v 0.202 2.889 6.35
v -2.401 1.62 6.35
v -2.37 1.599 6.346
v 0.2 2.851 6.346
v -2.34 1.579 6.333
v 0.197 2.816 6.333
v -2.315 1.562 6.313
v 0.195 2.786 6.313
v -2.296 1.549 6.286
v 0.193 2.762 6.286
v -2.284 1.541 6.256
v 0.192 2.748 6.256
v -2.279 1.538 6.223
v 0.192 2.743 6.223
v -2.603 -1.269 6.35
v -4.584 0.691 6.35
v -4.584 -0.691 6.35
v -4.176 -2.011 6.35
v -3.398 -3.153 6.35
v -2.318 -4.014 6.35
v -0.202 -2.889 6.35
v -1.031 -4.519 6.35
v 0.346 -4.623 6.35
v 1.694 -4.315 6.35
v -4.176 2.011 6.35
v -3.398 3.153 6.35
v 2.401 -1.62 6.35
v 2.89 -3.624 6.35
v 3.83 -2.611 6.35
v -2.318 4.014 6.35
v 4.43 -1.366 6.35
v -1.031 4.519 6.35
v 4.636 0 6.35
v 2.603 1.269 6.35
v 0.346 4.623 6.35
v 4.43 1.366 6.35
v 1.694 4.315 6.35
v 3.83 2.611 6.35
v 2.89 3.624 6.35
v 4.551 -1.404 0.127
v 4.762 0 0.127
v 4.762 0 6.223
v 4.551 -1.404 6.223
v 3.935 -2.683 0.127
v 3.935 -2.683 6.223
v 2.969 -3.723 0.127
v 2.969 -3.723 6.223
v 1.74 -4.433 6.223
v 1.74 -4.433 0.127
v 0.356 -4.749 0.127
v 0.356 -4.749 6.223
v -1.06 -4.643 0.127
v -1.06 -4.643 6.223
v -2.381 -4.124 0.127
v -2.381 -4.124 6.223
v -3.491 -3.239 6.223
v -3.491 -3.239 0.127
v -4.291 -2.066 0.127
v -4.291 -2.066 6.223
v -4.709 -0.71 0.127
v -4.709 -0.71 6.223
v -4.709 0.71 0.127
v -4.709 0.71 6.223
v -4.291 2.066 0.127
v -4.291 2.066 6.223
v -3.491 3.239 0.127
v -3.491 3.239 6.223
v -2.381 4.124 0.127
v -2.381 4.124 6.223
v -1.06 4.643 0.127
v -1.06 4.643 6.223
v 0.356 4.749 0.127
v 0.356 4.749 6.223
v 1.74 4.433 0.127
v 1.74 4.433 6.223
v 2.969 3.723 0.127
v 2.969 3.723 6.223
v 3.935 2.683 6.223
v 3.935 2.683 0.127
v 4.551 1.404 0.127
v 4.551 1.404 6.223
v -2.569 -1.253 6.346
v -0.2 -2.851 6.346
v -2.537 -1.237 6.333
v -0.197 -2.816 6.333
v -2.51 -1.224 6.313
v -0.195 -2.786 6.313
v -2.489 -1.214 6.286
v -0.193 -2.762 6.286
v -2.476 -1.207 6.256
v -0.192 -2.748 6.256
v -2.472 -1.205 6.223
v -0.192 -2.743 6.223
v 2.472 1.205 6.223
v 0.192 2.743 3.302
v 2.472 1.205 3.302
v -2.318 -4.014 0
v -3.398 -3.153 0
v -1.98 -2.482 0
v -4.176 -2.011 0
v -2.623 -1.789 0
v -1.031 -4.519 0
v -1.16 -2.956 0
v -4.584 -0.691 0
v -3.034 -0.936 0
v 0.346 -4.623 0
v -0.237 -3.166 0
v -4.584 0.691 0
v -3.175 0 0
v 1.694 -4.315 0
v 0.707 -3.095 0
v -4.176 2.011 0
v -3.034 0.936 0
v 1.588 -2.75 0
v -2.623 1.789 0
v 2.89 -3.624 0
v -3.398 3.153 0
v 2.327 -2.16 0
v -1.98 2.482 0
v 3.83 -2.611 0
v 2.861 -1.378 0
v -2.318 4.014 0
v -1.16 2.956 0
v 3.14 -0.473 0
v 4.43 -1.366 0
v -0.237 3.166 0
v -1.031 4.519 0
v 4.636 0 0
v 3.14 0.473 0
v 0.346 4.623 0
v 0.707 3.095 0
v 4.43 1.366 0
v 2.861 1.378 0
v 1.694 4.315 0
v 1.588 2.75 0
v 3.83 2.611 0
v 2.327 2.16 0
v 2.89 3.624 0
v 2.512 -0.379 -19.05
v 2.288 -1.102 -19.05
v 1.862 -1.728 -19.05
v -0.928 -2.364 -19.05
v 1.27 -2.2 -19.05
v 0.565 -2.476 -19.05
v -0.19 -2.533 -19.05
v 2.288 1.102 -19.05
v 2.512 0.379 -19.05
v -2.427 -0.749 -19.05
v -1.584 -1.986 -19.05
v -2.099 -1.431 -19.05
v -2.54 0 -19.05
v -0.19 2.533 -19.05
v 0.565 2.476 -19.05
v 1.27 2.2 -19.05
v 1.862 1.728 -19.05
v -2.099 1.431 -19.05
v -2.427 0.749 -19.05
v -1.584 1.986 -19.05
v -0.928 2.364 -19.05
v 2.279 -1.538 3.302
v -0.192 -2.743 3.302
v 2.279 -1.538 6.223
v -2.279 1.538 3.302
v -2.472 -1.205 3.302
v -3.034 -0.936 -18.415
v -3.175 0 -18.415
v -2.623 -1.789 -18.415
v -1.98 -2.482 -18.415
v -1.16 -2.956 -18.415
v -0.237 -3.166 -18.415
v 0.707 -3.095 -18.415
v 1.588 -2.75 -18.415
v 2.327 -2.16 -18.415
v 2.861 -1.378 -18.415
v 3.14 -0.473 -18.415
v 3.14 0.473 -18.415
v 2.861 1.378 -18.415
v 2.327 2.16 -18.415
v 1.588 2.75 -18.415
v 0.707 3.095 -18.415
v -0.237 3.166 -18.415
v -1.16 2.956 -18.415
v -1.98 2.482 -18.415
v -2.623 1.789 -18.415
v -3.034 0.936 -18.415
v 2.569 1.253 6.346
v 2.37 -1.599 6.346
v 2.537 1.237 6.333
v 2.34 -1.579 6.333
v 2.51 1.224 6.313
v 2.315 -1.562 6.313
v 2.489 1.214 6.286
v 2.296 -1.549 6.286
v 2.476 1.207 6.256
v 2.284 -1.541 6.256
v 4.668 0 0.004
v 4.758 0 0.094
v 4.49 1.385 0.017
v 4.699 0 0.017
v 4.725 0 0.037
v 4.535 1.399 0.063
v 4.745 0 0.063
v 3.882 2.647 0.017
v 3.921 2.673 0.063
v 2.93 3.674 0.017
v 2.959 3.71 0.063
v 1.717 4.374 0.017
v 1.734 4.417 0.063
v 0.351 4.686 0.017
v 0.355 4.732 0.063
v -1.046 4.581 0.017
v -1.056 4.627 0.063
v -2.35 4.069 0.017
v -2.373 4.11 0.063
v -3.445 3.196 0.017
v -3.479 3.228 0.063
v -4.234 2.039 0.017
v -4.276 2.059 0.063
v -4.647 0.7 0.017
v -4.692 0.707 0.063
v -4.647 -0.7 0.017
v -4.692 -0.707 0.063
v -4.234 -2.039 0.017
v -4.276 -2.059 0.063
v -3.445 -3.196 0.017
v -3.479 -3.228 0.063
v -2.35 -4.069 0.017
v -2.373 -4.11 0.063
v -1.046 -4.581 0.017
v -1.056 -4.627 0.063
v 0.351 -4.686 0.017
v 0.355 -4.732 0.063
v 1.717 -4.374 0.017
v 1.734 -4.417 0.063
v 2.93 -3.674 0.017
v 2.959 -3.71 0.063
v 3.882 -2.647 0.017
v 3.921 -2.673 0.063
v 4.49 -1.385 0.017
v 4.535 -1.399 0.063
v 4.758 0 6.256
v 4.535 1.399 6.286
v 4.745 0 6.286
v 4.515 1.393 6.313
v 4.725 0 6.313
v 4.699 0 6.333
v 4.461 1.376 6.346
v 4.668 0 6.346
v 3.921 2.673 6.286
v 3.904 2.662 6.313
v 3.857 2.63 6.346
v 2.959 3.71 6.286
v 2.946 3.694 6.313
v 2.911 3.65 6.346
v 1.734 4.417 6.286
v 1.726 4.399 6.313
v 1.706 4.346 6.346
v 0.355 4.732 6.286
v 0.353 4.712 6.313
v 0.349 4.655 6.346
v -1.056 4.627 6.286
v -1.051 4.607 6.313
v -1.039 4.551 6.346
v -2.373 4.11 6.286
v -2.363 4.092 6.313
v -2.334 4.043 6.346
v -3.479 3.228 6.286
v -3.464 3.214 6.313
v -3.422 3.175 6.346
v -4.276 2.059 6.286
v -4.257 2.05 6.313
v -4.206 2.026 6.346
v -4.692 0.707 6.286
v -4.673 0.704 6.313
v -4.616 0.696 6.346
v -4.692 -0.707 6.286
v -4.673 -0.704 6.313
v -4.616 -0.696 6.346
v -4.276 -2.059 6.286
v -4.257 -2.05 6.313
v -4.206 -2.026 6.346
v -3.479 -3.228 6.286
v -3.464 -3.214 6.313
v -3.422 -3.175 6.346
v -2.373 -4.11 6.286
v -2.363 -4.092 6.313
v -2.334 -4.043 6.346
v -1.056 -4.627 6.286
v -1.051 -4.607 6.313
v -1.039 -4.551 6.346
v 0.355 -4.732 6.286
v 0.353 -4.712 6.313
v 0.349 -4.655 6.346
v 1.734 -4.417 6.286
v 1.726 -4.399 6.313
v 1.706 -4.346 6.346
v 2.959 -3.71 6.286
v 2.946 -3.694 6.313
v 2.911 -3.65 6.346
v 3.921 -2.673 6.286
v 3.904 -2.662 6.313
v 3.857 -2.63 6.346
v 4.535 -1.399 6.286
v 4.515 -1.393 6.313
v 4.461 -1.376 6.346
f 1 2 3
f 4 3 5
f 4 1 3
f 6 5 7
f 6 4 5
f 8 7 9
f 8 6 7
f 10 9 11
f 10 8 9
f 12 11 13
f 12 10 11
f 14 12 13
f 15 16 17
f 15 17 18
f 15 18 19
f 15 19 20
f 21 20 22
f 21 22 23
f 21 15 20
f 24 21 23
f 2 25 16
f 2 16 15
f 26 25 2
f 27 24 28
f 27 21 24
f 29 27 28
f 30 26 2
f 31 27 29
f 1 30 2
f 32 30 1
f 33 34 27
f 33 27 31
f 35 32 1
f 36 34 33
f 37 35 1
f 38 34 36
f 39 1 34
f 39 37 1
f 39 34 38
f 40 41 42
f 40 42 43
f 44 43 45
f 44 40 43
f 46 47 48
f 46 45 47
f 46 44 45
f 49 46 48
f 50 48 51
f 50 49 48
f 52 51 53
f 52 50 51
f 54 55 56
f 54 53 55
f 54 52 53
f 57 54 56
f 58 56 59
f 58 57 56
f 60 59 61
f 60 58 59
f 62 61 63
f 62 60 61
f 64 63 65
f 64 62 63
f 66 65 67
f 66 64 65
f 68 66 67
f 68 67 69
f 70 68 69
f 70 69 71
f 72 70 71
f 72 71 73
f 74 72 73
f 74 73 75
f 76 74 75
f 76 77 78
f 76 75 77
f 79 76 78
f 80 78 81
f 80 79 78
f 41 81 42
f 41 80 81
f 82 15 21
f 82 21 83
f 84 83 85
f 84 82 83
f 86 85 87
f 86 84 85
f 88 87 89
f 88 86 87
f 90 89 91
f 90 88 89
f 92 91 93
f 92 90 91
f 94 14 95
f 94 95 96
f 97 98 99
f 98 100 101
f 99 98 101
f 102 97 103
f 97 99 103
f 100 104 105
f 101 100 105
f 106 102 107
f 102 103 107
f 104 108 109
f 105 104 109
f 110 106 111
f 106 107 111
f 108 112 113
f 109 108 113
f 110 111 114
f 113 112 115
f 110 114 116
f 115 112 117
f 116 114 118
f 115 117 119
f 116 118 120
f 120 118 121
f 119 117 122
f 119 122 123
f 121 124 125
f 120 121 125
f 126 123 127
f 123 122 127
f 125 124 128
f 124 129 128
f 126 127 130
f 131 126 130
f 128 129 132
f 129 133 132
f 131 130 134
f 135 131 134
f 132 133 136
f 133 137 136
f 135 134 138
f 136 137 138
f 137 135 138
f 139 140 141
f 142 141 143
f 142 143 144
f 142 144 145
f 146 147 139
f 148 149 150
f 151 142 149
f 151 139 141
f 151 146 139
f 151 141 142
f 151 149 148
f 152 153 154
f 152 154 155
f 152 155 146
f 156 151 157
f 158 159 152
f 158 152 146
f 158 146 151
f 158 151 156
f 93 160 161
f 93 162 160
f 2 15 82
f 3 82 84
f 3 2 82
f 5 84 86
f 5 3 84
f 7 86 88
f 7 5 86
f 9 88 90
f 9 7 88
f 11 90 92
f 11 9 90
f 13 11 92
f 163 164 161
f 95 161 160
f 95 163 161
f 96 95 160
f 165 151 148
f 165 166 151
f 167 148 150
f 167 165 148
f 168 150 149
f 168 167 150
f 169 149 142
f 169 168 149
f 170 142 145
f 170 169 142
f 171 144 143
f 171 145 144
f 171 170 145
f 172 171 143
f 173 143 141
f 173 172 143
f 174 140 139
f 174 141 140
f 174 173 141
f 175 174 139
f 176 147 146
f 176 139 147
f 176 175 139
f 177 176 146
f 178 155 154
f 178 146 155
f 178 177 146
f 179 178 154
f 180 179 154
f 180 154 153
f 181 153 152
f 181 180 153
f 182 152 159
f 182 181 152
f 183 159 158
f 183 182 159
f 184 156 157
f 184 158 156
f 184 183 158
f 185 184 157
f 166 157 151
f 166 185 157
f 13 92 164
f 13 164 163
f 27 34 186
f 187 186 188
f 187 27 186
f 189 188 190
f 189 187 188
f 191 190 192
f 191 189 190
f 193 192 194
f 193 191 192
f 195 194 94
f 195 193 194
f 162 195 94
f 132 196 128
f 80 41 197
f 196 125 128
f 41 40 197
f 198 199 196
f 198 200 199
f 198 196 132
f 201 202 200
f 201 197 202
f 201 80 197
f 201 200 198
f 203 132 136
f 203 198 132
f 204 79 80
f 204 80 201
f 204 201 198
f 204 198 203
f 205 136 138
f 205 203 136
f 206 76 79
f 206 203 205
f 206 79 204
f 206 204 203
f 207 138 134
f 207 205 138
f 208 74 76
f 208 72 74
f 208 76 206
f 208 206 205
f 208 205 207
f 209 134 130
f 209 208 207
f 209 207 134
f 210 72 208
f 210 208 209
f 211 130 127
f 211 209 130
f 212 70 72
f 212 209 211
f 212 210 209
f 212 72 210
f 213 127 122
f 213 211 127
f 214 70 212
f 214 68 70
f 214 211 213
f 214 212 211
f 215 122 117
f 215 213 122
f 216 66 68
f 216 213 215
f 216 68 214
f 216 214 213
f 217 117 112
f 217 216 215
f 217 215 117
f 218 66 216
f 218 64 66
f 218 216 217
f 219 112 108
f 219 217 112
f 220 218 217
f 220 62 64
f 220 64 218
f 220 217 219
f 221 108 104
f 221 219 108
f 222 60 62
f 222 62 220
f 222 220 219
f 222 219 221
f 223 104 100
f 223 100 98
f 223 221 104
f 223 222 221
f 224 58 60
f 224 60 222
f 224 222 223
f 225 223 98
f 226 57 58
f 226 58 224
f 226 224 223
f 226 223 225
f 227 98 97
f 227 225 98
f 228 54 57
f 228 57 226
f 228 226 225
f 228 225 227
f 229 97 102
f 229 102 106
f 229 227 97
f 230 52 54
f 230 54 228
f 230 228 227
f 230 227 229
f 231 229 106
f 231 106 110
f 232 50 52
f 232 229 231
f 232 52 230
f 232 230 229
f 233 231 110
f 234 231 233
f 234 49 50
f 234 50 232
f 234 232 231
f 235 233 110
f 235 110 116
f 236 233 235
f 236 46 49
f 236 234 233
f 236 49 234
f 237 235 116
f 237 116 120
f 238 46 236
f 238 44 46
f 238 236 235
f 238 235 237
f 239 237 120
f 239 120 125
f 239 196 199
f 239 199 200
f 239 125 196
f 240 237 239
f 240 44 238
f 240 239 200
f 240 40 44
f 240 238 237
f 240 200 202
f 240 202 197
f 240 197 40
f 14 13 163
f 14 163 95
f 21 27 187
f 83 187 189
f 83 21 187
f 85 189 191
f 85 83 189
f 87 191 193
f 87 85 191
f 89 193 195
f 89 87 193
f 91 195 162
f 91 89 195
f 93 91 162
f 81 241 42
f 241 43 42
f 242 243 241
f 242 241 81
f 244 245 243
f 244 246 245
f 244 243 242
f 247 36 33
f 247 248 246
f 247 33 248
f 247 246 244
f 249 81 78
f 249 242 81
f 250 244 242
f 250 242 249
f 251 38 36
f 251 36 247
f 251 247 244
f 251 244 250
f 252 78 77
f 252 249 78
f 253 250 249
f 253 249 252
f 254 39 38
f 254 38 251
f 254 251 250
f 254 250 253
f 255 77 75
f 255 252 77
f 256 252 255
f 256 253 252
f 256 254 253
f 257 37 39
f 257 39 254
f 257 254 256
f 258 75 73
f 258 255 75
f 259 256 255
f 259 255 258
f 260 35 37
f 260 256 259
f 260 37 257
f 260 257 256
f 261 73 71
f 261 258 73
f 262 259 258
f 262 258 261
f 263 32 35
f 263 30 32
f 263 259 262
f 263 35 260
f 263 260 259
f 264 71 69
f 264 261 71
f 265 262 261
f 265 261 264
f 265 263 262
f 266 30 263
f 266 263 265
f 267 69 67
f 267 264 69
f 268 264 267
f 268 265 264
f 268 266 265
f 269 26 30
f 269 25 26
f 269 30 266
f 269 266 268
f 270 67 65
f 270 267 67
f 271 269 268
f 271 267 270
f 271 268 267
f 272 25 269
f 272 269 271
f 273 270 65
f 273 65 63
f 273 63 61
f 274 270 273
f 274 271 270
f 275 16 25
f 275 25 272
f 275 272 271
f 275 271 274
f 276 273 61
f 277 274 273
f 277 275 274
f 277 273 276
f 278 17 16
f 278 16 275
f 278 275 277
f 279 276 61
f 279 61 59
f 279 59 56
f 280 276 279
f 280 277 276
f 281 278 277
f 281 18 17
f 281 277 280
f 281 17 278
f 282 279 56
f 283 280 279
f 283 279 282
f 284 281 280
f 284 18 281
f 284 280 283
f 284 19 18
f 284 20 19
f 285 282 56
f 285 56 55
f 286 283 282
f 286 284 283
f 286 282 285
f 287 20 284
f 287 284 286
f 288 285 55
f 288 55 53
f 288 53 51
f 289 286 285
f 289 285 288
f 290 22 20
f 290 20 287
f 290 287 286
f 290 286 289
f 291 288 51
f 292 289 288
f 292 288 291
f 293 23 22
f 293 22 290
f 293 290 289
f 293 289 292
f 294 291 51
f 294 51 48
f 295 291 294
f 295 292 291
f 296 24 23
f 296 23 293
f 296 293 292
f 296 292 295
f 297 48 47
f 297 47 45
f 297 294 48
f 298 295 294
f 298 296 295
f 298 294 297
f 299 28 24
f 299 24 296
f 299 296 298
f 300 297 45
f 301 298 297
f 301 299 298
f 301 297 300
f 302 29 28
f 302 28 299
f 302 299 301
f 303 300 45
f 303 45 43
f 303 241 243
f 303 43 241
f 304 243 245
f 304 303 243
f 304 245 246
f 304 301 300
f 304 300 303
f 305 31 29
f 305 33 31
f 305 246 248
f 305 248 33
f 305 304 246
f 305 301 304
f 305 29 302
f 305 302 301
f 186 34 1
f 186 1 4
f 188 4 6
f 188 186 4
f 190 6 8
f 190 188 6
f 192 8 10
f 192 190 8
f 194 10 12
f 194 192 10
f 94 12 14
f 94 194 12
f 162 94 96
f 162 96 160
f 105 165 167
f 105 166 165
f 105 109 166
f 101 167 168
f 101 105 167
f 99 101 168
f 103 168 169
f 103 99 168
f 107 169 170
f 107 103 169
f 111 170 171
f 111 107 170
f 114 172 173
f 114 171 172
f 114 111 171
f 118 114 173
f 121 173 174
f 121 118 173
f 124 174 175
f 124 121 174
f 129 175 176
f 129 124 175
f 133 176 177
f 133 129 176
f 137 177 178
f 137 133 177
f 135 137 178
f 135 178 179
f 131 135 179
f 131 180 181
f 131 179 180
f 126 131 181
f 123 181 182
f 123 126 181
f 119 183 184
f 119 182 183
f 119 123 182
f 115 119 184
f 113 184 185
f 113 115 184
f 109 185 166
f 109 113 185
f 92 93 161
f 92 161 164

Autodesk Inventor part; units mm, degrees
ref_plane "YZ Plane" through (0, 0, 0) normal (1, 0, 0) x (0, 1, 0)
ref_plane "XZ Plane" through (0, 0, 0) normal (0, 1, 0) x (-1, 0, 0)
ref_plane "XY Plane" through (0, 0, 0) normal (0, 0, 1) x (1, 0, 0)
sketch "Sketch1" plane through (0, 0, 0) normal (0, 0, 1) x (1, 0, 0)
  circle A0 centre (0, 0) radius 4.7625
  dimension "max_head_dia" = 9.525
extrude "Extrusion1" add sketch "Sketch1" along normal blind 6.35
sketch "Sketch2" plane through (0, 0, 0) normal (0, 0, -1) x (-1, 0, 0)
  circle A0 centre (0, 0) radius 4.7625 projected
  circle A1 centre (0, 0) radius 3.175
  dimension "max_body_dia" = 6.35
extrude "Extrusion2" add sketch "Sketch2" along normal blind 19.05 contours A1
sketch "Sketch3" plane through (0, 0, 6.35) normal (0, 0, 1) x (1, 0, 0)
  circle A0 centre (0, 0) radius 4.7625 projected
  line L0 (-2.2794, 1.5378) -> (0.192, 2.7429)
  line L1 (0.192, 2.7429) -> (2.4715, 1.2051)
  line L2 (2.4715, 1.2051) -> (2.2794, -1.5378)
  line L3 (2.2794, -1.5378) -> (-0.192, -2.7429)
  line L4 (-0.192, -2.7429) -> (-2.4715, -1.2051)
  line L5 (-2.4715, -1.2051) -> (-2.2794, 1.5378)
  dimension "hex_socket_size" = 4.7625
extrude "Extrusion3" cut sketch "Sketch3" against normal blind 3.048 contours L0 L1 L2 L3 L4 L5
thread "Thread2" size "1/4-20 UNC" class "2A" standard "ANSI Unified Screw Threads" length 25.4
chamfer "Chamfer1" distance 0.635 angle 45 1 edges at (3.175, 0, -19.05)
fillet "Fillet1" radius 0.127 1 edges at (-4.7625, 0, 0)
fillet "Fillet2" radius 0.127 1 edges at (-4.7625, 0, 6.35)
fillet "Fillet3" radius 0.127 6 edges at (-1.3318, -1.974, 6.35) (-2.3754, 0.1663, 6.35) (-1.0437, 2.1403, 6.35) (1.3318, 1.974, 6.35) (2.3754, -0.1663, 6.35) (1.0437, -2.1403, 6.35)
properties part number "4_40_hex_cap_screw"
